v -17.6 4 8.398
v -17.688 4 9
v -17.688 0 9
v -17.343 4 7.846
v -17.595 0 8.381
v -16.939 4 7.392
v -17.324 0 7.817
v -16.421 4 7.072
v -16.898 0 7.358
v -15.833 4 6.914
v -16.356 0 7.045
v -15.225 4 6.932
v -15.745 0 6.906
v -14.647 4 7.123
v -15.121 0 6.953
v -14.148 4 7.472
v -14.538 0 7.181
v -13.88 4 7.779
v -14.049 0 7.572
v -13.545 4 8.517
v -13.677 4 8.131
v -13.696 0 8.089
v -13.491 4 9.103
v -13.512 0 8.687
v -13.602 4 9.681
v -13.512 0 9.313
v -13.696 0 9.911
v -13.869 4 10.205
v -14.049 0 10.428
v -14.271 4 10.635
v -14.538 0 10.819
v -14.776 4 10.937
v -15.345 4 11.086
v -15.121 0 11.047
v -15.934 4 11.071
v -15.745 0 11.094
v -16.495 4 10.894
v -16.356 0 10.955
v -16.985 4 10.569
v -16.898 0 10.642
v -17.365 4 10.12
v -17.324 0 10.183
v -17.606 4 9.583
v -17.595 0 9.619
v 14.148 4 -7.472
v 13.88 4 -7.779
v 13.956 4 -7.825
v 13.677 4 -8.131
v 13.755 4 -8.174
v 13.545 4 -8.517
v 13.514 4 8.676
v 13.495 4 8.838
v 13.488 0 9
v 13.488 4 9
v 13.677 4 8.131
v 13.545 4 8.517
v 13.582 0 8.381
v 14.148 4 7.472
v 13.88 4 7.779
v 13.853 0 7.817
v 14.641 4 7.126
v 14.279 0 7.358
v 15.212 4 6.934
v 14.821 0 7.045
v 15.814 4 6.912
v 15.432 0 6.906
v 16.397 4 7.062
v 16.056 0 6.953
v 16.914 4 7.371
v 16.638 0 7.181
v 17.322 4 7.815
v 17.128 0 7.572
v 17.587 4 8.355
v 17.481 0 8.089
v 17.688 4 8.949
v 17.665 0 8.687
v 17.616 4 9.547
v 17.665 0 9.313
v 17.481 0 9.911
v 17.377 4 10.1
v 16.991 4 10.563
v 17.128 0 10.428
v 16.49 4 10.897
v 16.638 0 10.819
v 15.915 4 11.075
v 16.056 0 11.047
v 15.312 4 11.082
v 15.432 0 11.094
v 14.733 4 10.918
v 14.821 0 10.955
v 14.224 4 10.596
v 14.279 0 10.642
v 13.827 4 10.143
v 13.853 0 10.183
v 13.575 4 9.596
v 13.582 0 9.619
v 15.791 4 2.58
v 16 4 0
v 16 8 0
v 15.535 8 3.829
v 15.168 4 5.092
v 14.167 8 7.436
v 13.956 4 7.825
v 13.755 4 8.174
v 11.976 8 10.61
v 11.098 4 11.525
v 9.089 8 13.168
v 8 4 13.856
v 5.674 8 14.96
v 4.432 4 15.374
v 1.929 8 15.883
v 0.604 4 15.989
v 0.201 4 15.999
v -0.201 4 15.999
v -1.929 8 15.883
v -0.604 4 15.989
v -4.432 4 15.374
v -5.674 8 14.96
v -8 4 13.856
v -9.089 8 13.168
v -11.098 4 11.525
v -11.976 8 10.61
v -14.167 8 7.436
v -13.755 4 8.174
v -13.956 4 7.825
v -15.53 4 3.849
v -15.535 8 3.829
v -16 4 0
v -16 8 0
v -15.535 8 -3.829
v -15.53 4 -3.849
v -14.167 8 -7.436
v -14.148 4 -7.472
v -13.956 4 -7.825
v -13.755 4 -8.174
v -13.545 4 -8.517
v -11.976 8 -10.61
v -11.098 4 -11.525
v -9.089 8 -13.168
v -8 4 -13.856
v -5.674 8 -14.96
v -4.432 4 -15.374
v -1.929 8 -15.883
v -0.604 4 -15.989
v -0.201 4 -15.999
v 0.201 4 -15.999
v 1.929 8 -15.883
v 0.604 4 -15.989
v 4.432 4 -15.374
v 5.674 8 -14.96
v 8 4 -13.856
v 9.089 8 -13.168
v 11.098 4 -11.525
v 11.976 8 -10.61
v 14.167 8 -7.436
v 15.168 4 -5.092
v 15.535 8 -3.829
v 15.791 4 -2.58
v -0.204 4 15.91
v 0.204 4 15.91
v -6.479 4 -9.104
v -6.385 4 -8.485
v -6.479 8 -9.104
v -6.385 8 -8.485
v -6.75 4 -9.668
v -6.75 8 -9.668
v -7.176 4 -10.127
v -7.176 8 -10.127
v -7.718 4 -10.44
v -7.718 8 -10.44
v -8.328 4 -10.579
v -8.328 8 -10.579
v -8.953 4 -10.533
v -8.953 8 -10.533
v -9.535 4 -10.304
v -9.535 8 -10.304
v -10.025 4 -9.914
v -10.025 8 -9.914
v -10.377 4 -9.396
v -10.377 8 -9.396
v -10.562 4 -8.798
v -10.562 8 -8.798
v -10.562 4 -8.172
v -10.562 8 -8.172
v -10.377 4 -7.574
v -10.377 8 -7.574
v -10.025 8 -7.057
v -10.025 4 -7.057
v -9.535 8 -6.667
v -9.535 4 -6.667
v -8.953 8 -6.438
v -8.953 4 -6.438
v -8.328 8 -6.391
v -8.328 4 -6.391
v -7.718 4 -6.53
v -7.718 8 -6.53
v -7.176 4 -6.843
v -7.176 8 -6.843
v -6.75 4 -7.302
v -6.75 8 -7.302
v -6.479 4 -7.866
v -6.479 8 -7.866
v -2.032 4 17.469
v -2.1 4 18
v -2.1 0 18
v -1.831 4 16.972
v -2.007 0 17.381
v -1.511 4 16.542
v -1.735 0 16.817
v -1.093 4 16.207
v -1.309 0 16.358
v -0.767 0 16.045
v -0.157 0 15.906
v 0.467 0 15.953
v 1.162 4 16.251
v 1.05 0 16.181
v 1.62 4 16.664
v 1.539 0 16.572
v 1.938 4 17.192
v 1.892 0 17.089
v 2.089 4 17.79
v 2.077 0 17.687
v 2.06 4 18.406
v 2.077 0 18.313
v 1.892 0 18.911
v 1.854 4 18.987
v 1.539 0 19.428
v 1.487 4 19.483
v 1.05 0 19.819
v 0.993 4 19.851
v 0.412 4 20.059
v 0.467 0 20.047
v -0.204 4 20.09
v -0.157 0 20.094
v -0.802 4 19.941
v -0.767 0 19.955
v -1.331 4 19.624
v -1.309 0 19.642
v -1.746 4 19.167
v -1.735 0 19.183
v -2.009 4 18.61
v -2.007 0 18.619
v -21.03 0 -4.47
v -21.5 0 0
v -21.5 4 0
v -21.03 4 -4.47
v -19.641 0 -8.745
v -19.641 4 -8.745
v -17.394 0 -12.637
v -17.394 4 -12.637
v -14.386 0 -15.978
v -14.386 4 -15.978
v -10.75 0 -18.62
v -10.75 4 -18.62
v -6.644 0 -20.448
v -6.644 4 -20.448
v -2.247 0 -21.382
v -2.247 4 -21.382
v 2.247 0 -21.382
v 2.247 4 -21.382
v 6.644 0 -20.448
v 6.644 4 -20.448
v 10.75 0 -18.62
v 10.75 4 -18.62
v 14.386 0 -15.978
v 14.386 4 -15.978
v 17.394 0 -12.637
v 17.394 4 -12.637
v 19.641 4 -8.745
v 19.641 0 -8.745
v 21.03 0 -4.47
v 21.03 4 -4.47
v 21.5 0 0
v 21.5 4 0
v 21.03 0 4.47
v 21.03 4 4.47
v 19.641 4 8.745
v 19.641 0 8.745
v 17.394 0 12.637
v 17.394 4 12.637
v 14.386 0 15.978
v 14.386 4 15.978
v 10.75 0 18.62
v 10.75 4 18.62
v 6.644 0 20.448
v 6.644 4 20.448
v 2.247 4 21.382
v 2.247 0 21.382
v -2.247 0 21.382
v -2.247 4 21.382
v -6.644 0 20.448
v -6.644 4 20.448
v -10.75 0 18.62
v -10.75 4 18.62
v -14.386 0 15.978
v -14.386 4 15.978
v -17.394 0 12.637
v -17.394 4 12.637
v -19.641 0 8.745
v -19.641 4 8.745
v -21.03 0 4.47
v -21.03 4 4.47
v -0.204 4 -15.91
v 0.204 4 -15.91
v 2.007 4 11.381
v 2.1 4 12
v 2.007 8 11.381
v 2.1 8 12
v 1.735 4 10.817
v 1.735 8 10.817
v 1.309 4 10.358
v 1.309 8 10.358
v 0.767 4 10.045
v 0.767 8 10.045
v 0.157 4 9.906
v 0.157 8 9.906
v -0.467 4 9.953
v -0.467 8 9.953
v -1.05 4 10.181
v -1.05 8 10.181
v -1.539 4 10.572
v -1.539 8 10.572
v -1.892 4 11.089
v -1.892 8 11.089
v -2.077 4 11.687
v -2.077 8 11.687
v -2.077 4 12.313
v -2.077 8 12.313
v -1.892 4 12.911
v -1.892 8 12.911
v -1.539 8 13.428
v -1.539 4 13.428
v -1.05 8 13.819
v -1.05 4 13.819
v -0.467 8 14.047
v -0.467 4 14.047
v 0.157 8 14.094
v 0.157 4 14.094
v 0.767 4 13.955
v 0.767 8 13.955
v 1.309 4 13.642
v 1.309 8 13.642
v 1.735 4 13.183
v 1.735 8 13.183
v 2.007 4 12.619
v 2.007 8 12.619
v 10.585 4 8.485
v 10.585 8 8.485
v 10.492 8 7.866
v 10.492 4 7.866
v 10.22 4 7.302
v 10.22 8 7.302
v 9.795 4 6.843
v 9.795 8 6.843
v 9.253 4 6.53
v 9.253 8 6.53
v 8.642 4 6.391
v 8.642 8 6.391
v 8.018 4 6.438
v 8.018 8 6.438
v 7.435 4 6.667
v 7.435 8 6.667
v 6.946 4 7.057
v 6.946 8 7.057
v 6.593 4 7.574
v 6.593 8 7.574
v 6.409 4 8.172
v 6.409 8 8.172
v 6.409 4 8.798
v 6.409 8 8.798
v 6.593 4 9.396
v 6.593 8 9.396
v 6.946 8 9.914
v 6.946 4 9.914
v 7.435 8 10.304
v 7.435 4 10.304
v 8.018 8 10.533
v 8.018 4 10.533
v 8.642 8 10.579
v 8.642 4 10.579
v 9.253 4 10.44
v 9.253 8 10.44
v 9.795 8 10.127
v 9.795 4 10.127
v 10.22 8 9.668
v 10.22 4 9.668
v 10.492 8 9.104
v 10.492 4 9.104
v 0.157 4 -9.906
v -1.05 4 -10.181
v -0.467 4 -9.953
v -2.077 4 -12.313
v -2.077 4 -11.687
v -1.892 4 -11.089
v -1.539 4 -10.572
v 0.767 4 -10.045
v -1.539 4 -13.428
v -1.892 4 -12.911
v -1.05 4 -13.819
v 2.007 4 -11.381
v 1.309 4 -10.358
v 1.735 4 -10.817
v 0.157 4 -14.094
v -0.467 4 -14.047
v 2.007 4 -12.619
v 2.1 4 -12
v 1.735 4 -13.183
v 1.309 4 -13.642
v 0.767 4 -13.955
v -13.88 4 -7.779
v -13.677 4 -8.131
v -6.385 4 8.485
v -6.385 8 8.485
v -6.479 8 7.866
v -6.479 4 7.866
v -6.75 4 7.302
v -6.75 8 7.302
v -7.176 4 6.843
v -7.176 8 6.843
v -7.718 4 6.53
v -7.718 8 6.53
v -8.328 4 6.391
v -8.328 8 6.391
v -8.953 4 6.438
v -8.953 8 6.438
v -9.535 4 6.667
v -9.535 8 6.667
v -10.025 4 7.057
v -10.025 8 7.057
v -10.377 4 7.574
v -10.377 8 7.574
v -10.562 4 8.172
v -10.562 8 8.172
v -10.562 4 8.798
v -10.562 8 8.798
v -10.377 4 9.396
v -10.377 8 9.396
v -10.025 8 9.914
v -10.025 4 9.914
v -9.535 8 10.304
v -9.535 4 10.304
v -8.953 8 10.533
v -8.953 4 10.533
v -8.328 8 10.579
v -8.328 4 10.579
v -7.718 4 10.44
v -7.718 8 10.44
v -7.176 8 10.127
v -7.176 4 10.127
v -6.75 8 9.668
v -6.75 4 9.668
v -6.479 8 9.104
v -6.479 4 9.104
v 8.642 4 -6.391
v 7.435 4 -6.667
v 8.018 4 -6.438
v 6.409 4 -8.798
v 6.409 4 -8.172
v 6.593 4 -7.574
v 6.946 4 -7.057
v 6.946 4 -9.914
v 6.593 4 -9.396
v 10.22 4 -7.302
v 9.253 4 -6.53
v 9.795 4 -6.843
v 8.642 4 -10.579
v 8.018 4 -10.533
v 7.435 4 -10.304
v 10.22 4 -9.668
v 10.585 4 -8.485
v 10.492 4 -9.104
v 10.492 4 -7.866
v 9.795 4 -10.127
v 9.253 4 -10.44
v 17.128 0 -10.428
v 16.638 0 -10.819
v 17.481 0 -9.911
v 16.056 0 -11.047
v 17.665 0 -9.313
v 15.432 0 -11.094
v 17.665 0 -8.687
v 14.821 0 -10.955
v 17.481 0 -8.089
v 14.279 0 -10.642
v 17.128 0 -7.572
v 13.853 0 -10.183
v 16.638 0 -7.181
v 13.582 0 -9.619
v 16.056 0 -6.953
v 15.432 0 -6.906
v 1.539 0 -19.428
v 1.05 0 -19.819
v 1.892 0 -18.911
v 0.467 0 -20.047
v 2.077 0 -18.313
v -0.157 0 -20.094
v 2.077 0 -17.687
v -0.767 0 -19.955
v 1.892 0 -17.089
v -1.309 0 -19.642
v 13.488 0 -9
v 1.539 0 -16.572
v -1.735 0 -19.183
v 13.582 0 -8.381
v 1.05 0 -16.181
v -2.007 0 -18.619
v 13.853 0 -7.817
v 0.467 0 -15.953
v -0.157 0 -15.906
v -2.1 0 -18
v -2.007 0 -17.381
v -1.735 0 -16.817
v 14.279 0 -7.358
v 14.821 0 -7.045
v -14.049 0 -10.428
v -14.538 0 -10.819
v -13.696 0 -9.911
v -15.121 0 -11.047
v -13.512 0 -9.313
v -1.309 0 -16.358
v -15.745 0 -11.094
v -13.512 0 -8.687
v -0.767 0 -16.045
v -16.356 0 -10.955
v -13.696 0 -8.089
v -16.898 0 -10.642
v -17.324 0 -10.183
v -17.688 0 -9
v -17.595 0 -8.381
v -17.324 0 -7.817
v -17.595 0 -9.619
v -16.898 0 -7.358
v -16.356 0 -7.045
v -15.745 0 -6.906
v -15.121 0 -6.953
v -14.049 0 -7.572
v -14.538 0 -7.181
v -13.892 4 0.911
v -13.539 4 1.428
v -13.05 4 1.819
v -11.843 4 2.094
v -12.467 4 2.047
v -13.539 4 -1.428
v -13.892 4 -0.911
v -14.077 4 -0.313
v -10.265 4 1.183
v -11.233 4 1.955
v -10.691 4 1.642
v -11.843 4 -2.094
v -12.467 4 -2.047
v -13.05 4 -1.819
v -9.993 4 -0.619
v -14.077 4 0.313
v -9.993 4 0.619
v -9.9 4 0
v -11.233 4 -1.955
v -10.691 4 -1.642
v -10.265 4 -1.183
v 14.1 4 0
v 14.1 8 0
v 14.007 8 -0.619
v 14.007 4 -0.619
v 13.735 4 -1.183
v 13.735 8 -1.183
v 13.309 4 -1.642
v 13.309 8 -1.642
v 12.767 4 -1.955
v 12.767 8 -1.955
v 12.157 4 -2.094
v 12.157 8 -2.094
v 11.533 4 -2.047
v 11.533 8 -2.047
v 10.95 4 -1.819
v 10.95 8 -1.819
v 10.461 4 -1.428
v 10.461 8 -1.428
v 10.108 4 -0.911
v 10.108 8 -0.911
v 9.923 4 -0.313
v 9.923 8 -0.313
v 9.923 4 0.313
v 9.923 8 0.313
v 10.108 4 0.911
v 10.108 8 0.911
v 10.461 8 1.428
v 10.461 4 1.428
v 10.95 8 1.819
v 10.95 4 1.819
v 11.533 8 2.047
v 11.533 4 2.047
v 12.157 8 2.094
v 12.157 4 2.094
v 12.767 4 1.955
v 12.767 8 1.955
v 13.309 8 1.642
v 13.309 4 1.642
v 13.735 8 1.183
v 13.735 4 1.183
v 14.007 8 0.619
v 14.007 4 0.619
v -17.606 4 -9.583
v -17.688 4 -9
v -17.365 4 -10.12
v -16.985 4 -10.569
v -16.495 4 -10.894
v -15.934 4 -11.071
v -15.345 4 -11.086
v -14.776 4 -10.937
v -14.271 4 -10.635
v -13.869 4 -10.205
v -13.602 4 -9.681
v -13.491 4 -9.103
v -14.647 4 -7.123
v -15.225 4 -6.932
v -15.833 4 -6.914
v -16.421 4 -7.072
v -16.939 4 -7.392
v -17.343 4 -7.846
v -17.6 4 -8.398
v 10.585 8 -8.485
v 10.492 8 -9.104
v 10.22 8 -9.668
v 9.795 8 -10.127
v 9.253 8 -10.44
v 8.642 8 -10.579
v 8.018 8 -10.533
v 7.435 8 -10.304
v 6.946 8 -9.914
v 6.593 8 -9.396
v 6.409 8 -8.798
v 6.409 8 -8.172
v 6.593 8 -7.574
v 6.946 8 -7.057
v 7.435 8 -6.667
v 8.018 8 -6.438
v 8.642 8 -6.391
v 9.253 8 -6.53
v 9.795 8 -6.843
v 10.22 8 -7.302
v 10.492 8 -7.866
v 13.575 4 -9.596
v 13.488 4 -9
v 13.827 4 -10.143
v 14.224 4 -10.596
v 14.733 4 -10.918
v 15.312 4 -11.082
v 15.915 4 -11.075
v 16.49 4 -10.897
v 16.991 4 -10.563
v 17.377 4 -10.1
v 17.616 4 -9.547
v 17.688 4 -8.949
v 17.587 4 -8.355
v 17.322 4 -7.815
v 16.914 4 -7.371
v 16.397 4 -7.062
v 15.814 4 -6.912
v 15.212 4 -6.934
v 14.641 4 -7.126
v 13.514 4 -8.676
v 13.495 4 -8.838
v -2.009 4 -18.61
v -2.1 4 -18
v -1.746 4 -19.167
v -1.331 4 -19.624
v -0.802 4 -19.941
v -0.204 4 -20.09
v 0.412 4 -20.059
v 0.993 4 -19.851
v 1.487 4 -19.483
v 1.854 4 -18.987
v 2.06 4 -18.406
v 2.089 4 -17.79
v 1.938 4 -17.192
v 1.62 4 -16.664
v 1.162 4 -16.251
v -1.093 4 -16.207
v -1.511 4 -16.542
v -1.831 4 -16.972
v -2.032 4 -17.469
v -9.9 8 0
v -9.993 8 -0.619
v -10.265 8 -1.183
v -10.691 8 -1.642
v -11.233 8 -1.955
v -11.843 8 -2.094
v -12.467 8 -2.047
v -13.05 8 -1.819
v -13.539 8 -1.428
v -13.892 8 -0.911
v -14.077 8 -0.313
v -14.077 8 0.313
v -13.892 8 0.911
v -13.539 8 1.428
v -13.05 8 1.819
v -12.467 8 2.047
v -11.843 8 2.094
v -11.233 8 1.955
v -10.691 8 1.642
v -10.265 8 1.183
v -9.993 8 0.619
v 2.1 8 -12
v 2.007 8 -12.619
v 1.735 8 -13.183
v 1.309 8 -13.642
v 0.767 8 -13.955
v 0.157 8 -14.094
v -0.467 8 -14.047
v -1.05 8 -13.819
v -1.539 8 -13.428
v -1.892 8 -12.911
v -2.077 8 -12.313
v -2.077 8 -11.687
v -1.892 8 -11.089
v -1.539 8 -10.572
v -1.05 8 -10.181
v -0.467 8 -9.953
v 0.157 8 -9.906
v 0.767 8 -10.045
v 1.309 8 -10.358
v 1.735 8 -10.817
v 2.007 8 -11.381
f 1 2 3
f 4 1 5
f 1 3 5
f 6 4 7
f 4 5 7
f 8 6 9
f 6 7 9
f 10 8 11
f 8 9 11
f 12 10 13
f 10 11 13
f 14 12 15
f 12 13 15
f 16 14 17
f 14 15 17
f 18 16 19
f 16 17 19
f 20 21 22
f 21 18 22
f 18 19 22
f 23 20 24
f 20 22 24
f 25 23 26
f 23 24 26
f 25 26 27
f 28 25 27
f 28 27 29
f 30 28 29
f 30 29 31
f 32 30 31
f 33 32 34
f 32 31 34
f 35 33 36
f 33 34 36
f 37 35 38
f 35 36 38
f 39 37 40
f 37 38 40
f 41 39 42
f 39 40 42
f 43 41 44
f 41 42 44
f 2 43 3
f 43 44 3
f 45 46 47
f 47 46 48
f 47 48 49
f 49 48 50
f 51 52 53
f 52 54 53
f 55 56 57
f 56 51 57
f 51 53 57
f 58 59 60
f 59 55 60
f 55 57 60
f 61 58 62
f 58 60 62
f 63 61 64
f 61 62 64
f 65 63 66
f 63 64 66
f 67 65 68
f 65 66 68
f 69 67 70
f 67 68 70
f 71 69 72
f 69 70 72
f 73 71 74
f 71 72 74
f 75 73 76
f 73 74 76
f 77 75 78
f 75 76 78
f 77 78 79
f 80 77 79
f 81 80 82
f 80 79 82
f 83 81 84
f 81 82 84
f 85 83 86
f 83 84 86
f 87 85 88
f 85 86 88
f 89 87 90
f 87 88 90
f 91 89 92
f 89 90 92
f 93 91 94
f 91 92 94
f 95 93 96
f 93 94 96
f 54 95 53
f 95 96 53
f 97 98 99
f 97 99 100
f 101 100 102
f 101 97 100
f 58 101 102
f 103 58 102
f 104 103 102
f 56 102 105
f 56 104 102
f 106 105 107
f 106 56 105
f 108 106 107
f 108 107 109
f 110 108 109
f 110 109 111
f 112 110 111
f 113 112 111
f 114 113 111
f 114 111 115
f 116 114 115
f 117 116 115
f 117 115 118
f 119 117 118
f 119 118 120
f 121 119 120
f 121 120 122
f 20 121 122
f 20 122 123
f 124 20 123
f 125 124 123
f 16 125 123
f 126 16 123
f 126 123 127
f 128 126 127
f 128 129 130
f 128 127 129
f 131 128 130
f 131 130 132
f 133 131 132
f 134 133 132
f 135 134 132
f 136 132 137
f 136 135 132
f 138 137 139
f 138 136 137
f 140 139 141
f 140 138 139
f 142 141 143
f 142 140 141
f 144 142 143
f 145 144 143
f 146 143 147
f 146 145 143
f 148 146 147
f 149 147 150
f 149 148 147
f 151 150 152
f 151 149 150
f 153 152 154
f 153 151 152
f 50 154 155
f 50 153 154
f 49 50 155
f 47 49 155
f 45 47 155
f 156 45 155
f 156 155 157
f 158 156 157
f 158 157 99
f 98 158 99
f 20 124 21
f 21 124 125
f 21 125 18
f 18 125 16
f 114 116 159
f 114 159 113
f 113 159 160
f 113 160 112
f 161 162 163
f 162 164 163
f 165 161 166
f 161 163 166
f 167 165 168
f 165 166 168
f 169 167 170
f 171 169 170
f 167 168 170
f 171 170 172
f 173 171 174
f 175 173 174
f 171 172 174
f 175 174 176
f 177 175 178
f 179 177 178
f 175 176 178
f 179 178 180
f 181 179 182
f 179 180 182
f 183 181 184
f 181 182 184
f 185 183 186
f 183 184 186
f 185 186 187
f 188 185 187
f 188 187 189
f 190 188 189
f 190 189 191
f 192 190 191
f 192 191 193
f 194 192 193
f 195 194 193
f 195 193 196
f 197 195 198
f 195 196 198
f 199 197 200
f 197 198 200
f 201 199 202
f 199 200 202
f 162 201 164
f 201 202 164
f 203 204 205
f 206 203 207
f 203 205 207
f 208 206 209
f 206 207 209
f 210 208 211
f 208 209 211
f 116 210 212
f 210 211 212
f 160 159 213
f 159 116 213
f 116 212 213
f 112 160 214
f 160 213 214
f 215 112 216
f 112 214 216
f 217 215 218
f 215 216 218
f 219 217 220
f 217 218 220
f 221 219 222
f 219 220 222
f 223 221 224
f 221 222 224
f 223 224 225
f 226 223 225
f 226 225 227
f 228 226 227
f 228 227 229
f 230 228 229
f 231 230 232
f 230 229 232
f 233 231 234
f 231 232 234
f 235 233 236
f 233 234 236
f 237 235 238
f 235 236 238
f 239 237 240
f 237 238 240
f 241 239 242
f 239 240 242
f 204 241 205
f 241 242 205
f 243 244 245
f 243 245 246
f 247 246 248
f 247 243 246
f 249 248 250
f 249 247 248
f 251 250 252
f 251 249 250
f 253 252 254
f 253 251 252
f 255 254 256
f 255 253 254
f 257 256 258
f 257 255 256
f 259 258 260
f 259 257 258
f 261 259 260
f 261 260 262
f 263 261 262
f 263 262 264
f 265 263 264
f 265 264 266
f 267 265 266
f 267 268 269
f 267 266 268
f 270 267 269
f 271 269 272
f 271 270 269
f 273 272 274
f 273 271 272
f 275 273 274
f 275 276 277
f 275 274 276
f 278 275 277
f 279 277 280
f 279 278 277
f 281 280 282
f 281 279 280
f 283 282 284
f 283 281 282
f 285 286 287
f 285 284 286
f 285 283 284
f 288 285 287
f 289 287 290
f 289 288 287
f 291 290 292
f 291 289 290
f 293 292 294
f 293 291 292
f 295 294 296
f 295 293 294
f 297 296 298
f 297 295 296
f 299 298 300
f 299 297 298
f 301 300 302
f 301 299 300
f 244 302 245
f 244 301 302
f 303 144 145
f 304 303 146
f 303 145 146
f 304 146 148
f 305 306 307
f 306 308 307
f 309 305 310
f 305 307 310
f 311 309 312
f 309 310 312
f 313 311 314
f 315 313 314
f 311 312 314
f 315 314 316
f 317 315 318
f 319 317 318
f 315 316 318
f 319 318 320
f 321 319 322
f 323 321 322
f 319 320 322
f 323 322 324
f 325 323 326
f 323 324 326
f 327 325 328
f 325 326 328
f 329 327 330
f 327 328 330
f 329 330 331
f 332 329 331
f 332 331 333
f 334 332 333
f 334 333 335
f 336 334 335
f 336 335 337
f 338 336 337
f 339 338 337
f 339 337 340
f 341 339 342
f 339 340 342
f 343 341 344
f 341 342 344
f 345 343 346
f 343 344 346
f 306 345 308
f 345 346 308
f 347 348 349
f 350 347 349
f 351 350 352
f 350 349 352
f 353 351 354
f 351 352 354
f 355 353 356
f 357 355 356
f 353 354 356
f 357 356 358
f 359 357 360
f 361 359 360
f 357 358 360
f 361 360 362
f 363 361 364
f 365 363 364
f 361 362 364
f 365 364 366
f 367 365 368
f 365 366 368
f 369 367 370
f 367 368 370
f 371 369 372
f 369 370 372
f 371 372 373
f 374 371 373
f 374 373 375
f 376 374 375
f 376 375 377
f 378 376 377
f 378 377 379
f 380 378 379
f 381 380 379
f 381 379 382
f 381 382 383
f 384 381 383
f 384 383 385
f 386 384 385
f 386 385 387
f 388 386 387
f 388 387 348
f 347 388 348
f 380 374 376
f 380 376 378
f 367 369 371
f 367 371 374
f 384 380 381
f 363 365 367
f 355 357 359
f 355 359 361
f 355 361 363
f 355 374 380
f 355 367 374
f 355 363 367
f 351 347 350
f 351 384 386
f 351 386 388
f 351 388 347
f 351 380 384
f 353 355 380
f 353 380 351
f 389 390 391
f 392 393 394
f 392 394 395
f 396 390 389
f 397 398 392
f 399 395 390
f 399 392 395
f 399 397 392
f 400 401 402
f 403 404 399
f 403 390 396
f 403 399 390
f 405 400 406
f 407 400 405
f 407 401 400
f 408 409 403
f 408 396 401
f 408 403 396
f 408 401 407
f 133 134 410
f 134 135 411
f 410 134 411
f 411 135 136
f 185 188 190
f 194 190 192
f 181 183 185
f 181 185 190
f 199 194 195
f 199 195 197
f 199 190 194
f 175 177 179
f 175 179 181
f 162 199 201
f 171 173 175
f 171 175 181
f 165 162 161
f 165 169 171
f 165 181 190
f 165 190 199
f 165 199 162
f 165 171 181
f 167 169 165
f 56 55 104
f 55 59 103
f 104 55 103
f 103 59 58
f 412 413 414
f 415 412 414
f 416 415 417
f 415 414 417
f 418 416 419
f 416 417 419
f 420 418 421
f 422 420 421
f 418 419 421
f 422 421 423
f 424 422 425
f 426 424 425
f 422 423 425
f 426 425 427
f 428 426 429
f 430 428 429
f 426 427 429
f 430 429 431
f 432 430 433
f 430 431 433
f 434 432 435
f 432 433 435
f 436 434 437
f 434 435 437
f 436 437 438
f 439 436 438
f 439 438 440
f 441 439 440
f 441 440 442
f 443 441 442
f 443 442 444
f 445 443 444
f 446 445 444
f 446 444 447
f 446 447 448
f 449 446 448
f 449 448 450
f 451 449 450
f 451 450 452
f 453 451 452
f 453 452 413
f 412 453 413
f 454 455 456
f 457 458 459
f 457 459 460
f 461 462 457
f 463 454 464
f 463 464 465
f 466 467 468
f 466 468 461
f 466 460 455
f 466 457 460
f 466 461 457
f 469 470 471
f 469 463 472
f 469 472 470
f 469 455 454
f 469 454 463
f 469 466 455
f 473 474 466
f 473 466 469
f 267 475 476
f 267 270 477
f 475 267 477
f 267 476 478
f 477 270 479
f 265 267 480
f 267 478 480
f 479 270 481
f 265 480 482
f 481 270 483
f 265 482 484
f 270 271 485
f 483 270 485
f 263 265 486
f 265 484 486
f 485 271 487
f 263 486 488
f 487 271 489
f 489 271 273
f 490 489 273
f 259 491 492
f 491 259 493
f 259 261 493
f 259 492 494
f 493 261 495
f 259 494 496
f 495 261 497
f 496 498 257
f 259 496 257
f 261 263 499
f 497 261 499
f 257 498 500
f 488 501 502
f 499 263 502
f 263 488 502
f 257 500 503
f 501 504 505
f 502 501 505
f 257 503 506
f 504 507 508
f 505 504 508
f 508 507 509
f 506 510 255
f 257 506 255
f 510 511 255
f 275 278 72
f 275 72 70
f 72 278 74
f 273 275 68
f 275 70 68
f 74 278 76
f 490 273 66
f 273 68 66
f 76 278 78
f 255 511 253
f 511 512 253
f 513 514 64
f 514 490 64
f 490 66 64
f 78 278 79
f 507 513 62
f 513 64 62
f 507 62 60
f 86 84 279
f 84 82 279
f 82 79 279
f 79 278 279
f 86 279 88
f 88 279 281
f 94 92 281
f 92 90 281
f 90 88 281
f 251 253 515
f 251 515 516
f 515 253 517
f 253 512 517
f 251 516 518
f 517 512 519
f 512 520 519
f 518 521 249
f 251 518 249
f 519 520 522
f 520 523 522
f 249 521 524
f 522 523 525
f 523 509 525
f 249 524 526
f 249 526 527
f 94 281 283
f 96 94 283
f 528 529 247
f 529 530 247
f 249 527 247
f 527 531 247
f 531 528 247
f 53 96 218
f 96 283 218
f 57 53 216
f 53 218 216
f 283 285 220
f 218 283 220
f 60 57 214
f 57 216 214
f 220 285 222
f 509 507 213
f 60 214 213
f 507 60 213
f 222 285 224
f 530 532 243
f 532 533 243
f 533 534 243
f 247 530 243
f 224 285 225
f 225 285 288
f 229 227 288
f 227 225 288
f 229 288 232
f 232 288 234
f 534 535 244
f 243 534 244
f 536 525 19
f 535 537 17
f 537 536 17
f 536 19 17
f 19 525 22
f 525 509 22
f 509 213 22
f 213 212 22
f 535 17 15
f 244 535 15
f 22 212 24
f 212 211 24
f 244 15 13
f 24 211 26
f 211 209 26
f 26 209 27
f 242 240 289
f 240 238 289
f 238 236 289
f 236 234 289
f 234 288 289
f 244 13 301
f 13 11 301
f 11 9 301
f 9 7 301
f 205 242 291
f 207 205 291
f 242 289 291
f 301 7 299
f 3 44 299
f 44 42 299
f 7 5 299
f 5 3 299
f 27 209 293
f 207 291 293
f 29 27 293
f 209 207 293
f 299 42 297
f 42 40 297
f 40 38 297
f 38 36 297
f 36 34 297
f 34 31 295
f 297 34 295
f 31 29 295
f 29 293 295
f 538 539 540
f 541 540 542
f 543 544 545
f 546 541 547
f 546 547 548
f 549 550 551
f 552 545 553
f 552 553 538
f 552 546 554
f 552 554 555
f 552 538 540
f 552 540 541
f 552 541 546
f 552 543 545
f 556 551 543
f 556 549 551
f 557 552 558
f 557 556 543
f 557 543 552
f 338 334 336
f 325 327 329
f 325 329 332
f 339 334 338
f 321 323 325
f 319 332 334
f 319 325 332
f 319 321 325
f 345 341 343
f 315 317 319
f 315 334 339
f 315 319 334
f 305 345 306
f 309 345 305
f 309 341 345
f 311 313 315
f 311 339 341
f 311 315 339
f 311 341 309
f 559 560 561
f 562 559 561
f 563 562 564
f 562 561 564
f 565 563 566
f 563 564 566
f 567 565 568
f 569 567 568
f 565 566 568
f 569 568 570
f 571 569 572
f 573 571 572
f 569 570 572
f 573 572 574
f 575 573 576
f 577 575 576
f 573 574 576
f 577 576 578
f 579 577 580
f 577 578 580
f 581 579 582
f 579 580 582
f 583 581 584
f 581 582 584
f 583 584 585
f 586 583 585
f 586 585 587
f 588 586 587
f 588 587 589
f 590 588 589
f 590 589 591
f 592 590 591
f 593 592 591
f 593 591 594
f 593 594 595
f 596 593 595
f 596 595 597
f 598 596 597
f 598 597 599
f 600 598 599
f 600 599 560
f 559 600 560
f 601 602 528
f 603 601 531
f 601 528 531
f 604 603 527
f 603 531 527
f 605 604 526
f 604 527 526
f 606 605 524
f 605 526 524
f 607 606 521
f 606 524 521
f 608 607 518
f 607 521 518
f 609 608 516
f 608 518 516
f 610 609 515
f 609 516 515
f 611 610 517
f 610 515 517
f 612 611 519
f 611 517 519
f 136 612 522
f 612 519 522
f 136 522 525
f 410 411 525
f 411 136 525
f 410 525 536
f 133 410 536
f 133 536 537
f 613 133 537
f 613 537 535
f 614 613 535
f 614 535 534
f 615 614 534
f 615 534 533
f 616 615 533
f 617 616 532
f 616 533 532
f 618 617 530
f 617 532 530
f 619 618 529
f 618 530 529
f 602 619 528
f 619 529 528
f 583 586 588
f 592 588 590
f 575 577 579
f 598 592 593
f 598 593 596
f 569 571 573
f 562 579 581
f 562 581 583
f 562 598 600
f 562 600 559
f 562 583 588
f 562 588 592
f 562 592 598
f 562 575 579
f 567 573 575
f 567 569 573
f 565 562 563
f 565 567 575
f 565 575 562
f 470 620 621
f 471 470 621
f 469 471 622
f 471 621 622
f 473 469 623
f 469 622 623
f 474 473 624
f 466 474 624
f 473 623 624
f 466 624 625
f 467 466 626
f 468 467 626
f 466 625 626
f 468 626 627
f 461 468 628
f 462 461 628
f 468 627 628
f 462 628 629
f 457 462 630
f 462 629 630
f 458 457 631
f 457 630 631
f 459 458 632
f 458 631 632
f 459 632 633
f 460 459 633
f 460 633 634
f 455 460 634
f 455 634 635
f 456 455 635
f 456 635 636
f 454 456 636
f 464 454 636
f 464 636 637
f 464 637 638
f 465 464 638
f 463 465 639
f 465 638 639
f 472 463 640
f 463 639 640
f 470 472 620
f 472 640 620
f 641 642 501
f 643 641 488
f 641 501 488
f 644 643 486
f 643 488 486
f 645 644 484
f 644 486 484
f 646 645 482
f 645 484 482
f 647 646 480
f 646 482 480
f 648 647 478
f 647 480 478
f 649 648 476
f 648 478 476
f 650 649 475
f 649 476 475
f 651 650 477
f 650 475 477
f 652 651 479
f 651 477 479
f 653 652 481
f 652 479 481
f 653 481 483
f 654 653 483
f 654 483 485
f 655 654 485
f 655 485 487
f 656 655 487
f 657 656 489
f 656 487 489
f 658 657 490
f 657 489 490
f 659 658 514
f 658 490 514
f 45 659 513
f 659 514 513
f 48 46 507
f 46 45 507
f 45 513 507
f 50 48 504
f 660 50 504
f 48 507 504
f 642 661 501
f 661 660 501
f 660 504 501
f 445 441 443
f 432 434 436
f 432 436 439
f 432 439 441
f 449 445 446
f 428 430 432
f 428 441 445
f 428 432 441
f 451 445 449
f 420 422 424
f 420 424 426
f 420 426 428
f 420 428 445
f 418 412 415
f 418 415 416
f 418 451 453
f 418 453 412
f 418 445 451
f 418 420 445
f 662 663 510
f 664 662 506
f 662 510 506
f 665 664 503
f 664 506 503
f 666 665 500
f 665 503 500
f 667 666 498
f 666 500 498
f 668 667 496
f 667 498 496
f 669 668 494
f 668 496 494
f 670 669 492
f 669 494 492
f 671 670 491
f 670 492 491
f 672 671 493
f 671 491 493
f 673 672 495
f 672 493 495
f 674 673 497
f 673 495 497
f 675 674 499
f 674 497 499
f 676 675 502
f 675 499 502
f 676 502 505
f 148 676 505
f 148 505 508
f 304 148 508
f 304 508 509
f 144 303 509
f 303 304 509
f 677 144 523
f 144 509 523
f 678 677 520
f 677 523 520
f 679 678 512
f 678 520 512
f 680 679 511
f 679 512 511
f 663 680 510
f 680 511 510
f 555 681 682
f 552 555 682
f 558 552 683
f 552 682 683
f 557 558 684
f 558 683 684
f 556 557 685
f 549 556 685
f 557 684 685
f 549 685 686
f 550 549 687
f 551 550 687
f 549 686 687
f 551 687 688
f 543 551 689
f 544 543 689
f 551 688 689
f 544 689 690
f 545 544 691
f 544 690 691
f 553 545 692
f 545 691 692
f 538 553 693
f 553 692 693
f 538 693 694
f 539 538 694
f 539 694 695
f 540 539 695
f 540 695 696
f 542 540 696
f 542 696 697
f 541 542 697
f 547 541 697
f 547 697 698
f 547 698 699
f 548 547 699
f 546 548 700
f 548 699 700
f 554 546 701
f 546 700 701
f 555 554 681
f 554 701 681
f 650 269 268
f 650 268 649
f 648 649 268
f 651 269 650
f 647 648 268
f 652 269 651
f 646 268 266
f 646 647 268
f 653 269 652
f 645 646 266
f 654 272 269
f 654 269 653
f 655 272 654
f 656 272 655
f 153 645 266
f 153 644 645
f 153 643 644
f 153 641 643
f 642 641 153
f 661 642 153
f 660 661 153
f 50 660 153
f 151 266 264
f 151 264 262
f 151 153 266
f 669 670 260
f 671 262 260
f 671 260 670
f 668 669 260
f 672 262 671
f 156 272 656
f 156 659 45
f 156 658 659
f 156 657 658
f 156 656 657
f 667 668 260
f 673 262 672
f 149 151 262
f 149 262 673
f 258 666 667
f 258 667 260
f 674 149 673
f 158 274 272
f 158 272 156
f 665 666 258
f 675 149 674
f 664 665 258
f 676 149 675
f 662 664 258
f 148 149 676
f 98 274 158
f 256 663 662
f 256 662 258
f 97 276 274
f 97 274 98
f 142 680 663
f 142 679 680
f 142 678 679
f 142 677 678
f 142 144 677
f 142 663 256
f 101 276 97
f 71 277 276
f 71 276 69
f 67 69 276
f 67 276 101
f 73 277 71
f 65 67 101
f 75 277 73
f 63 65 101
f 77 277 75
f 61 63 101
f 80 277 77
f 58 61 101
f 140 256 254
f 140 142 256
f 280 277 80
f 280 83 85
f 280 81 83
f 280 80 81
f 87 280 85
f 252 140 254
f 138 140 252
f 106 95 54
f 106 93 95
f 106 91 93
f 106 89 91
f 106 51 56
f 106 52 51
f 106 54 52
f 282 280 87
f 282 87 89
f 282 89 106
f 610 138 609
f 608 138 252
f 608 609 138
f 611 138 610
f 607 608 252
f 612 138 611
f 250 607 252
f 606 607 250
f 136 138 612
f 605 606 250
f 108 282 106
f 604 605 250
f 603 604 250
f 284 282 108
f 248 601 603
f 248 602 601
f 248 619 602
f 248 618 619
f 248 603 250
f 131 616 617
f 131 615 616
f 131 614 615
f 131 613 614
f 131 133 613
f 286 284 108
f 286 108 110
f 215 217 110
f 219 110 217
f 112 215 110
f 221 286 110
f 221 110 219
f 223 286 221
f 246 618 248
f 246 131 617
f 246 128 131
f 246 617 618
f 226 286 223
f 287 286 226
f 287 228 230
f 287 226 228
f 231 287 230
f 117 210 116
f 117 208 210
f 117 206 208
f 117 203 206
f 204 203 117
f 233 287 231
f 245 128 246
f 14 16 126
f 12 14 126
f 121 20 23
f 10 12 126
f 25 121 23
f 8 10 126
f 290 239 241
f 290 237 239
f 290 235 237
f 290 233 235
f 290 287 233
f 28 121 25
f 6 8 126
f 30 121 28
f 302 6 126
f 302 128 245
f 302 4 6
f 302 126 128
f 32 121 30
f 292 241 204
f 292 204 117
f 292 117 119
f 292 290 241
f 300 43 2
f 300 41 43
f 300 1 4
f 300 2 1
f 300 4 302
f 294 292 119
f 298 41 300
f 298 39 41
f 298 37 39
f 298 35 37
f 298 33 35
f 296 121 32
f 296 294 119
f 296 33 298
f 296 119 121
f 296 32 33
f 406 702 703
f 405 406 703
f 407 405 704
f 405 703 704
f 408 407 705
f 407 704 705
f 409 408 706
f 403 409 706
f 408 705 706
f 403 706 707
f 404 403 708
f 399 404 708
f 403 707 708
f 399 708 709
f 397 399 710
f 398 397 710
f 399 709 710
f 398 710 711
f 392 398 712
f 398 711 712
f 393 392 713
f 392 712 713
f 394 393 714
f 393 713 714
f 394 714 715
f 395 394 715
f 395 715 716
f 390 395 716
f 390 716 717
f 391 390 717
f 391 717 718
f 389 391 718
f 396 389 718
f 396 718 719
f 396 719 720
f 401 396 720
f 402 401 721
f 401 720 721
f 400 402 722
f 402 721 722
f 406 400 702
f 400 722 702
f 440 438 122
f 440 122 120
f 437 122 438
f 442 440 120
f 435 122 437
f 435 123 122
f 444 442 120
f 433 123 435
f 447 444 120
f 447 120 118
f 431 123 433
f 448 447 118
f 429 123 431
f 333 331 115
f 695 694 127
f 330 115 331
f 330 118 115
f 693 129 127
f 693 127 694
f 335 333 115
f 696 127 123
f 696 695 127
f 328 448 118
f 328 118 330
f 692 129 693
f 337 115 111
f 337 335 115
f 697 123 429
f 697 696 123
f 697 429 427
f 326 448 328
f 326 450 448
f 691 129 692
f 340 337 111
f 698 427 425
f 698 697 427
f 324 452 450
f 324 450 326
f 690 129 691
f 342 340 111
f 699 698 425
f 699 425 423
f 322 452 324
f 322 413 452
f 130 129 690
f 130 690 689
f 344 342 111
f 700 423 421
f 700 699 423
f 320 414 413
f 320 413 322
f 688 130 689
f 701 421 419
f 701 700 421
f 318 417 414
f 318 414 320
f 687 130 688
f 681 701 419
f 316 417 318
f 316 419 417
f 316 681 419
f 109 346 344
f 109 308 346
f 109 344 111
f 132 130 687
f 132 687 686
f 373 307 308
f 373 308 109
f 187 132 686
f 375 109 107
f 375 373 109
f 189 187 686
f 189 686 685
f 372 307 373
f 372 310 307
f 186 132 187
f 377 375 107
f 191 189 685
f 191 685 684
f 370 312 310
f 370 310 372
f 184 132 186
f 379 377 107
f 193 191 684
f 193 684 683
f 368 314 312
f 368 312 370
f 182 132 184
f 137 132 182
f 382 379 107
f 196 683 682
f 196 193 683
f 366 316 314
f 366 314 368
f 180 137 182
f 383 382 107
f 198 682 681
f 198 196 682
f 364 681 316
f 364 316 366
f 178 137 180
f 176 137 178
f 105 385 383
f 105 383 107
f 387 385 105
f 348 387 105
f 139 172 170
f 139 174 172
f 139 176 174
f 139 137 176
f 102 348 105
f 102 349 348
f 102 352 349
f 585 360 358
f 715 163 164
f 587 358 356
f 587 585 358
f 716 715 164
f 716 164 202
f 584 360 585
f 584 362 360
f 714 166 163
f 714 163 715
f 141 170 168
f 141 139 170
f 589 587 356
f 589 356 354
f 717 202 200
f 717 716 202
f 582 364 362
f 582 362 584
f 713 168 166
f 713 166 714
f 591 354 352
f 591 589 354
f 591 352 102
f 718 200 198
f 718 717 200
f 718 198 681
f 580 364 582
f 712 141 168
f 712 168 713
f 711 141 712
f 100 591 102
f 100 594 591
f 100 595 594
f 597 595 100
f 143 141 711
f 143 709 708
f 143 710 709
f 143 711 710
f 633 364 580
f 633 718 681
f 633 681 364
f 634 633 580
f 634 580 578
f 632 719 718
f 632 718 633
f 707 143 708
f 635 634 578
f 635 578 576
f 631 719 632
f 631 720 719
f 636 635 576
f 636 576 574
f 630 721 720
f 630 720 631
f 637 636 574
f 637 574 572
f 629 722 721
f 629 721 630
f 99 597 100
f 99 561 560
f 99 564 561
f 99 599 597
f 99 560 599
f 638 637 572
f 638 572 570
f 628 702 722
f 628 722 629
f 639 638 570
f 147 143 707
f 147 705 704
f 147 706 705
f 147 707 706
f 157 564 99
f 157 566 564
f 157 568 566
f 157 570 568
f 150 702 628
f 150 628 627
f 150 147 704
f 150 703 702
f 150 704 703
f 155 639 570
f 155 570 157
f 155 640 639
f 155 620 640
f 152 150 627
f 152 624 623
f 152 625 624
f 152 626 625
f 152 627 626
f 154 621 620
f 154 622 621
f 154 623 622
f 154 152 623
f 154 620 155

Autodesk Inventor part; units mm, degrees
ref_plane "YZ Plane" through (0, 0, 0) normal (1, 0, 0) x (0, 1, 0)
ref_plane "XZ Plane" through (0, 0, 0) normal (0, 1, 0) x (-1, 0, 0)
ref_plane "XY Plane" through (0, 0, 0) normal (0, 0, 1) x (1, 0, 0)
sketch "Sketch1" plane through (0, 0, 0) normal (0, 1, 0) x (-1, 0, 0)
  circle A0 centre (0, 0) radius 21.5
  circle A1 centre (0, -18) radius 2.1
  circle A2 centre (15.5885, -9) radius 2.1
  circle A3 centre (15.5885, 9) radius 2.1
  circle A4 centre (0, 18) radius 2.1
  circle A5 centre (-15.5885, 9) radius 2.1
  circle A6 centre (-15.5885, -9) radius 2.1
  dimension "d0" = 43
  dimension "d1" = 4.2
  dimension "d2" = 18
  dimension "d5" = 360
extrude "Extrusion1" add sketch "Sketch1" along normal blind 4
sketch "Sketch2" plane through (0, 4, 0) normal (0, 1, 0) x (1, 0, 0)
  circle A0 centre (0, 0) radius 16
  dimension "d9" = 32
thread "Thread1" size "M4x0.7" class "6H" standard "ANSI Metric M Profile" full length
thread "Thread2" size "M4x0.7" class "6H" standard "ANSI Metric M Profile" full length
thread "Thread3" size "M4x0.7" class "6H" standard "ANSI Metric M Profile" full length
thread "Thread4" size "M4x0.7" class "6H" standard "ANSI Metric M Profile" full length
thread "Thread5" size "M4x0.7" class "6H" standard "ANSI Metric M Profile" full length
thread "Thread6" size "M4x0.7" class "6H" standard "ANSI Metric M Profile" full length
extrude "Extrusion2" add sketch "Sketch2" along normal blind 4
sketch "Sketch3" plane through (0, 8, 0) normal (0, 1, 0) x (1, 0, 0)
  circle A0 centre (0, 12) radius 2.1
  circle A1 centre (-8.4853, 8.4853) radius 2.1
  circle A2 centre (-12, 0) radius 2.1
  circle A3 centre (-8.4853, -8.4853) radius 2.1
  circle A4 centre (0, -12) radius 2.1
  circle A5 centre (8.4853, -8.4853) radius 2.1
  circle A6 centre (12, 0) radius 2.1
  circle A7 centre (8.4853, 8.4853) radius 2.1
  point P0 (0, 0)
  dimension "d27" = 4.2
  dimension "d32" = 360
  dimension "d44" = 12
extrude "Extrusion3" cut sketch "Sketch3" against normal blind 4
thread "Thread7" size "M4x0.7" class "6H" standard "ANSI Metric M Profile" full length
thread "Thread8" size "M4x0.7" class "6H" standard "ANSI Metric M Profile" full length
thread "Thread9" size "M4x0.7" class "6H" standard "ANSI Metric M Profile" full length
thread "Thread10" size "M4x0.7" class "6H" standard "ANSI Metric M Profile" full length
thread "Thread11" size "M4x0.7" class "6H" standard "ANSI Metric M Profile" full length
thread "Thread12" size "M4x0.7" class "6H" standard "ANSI Metric M Profile" full length
thread "Thread13" size "M4x0.7" class "6H" standard "ANSI Metric M Profile" full length
thread "Thread14" size "M4x0.7" class "6H" standard "ANSI Metric M Profile" full length
properties part number "OutPutPlate"
